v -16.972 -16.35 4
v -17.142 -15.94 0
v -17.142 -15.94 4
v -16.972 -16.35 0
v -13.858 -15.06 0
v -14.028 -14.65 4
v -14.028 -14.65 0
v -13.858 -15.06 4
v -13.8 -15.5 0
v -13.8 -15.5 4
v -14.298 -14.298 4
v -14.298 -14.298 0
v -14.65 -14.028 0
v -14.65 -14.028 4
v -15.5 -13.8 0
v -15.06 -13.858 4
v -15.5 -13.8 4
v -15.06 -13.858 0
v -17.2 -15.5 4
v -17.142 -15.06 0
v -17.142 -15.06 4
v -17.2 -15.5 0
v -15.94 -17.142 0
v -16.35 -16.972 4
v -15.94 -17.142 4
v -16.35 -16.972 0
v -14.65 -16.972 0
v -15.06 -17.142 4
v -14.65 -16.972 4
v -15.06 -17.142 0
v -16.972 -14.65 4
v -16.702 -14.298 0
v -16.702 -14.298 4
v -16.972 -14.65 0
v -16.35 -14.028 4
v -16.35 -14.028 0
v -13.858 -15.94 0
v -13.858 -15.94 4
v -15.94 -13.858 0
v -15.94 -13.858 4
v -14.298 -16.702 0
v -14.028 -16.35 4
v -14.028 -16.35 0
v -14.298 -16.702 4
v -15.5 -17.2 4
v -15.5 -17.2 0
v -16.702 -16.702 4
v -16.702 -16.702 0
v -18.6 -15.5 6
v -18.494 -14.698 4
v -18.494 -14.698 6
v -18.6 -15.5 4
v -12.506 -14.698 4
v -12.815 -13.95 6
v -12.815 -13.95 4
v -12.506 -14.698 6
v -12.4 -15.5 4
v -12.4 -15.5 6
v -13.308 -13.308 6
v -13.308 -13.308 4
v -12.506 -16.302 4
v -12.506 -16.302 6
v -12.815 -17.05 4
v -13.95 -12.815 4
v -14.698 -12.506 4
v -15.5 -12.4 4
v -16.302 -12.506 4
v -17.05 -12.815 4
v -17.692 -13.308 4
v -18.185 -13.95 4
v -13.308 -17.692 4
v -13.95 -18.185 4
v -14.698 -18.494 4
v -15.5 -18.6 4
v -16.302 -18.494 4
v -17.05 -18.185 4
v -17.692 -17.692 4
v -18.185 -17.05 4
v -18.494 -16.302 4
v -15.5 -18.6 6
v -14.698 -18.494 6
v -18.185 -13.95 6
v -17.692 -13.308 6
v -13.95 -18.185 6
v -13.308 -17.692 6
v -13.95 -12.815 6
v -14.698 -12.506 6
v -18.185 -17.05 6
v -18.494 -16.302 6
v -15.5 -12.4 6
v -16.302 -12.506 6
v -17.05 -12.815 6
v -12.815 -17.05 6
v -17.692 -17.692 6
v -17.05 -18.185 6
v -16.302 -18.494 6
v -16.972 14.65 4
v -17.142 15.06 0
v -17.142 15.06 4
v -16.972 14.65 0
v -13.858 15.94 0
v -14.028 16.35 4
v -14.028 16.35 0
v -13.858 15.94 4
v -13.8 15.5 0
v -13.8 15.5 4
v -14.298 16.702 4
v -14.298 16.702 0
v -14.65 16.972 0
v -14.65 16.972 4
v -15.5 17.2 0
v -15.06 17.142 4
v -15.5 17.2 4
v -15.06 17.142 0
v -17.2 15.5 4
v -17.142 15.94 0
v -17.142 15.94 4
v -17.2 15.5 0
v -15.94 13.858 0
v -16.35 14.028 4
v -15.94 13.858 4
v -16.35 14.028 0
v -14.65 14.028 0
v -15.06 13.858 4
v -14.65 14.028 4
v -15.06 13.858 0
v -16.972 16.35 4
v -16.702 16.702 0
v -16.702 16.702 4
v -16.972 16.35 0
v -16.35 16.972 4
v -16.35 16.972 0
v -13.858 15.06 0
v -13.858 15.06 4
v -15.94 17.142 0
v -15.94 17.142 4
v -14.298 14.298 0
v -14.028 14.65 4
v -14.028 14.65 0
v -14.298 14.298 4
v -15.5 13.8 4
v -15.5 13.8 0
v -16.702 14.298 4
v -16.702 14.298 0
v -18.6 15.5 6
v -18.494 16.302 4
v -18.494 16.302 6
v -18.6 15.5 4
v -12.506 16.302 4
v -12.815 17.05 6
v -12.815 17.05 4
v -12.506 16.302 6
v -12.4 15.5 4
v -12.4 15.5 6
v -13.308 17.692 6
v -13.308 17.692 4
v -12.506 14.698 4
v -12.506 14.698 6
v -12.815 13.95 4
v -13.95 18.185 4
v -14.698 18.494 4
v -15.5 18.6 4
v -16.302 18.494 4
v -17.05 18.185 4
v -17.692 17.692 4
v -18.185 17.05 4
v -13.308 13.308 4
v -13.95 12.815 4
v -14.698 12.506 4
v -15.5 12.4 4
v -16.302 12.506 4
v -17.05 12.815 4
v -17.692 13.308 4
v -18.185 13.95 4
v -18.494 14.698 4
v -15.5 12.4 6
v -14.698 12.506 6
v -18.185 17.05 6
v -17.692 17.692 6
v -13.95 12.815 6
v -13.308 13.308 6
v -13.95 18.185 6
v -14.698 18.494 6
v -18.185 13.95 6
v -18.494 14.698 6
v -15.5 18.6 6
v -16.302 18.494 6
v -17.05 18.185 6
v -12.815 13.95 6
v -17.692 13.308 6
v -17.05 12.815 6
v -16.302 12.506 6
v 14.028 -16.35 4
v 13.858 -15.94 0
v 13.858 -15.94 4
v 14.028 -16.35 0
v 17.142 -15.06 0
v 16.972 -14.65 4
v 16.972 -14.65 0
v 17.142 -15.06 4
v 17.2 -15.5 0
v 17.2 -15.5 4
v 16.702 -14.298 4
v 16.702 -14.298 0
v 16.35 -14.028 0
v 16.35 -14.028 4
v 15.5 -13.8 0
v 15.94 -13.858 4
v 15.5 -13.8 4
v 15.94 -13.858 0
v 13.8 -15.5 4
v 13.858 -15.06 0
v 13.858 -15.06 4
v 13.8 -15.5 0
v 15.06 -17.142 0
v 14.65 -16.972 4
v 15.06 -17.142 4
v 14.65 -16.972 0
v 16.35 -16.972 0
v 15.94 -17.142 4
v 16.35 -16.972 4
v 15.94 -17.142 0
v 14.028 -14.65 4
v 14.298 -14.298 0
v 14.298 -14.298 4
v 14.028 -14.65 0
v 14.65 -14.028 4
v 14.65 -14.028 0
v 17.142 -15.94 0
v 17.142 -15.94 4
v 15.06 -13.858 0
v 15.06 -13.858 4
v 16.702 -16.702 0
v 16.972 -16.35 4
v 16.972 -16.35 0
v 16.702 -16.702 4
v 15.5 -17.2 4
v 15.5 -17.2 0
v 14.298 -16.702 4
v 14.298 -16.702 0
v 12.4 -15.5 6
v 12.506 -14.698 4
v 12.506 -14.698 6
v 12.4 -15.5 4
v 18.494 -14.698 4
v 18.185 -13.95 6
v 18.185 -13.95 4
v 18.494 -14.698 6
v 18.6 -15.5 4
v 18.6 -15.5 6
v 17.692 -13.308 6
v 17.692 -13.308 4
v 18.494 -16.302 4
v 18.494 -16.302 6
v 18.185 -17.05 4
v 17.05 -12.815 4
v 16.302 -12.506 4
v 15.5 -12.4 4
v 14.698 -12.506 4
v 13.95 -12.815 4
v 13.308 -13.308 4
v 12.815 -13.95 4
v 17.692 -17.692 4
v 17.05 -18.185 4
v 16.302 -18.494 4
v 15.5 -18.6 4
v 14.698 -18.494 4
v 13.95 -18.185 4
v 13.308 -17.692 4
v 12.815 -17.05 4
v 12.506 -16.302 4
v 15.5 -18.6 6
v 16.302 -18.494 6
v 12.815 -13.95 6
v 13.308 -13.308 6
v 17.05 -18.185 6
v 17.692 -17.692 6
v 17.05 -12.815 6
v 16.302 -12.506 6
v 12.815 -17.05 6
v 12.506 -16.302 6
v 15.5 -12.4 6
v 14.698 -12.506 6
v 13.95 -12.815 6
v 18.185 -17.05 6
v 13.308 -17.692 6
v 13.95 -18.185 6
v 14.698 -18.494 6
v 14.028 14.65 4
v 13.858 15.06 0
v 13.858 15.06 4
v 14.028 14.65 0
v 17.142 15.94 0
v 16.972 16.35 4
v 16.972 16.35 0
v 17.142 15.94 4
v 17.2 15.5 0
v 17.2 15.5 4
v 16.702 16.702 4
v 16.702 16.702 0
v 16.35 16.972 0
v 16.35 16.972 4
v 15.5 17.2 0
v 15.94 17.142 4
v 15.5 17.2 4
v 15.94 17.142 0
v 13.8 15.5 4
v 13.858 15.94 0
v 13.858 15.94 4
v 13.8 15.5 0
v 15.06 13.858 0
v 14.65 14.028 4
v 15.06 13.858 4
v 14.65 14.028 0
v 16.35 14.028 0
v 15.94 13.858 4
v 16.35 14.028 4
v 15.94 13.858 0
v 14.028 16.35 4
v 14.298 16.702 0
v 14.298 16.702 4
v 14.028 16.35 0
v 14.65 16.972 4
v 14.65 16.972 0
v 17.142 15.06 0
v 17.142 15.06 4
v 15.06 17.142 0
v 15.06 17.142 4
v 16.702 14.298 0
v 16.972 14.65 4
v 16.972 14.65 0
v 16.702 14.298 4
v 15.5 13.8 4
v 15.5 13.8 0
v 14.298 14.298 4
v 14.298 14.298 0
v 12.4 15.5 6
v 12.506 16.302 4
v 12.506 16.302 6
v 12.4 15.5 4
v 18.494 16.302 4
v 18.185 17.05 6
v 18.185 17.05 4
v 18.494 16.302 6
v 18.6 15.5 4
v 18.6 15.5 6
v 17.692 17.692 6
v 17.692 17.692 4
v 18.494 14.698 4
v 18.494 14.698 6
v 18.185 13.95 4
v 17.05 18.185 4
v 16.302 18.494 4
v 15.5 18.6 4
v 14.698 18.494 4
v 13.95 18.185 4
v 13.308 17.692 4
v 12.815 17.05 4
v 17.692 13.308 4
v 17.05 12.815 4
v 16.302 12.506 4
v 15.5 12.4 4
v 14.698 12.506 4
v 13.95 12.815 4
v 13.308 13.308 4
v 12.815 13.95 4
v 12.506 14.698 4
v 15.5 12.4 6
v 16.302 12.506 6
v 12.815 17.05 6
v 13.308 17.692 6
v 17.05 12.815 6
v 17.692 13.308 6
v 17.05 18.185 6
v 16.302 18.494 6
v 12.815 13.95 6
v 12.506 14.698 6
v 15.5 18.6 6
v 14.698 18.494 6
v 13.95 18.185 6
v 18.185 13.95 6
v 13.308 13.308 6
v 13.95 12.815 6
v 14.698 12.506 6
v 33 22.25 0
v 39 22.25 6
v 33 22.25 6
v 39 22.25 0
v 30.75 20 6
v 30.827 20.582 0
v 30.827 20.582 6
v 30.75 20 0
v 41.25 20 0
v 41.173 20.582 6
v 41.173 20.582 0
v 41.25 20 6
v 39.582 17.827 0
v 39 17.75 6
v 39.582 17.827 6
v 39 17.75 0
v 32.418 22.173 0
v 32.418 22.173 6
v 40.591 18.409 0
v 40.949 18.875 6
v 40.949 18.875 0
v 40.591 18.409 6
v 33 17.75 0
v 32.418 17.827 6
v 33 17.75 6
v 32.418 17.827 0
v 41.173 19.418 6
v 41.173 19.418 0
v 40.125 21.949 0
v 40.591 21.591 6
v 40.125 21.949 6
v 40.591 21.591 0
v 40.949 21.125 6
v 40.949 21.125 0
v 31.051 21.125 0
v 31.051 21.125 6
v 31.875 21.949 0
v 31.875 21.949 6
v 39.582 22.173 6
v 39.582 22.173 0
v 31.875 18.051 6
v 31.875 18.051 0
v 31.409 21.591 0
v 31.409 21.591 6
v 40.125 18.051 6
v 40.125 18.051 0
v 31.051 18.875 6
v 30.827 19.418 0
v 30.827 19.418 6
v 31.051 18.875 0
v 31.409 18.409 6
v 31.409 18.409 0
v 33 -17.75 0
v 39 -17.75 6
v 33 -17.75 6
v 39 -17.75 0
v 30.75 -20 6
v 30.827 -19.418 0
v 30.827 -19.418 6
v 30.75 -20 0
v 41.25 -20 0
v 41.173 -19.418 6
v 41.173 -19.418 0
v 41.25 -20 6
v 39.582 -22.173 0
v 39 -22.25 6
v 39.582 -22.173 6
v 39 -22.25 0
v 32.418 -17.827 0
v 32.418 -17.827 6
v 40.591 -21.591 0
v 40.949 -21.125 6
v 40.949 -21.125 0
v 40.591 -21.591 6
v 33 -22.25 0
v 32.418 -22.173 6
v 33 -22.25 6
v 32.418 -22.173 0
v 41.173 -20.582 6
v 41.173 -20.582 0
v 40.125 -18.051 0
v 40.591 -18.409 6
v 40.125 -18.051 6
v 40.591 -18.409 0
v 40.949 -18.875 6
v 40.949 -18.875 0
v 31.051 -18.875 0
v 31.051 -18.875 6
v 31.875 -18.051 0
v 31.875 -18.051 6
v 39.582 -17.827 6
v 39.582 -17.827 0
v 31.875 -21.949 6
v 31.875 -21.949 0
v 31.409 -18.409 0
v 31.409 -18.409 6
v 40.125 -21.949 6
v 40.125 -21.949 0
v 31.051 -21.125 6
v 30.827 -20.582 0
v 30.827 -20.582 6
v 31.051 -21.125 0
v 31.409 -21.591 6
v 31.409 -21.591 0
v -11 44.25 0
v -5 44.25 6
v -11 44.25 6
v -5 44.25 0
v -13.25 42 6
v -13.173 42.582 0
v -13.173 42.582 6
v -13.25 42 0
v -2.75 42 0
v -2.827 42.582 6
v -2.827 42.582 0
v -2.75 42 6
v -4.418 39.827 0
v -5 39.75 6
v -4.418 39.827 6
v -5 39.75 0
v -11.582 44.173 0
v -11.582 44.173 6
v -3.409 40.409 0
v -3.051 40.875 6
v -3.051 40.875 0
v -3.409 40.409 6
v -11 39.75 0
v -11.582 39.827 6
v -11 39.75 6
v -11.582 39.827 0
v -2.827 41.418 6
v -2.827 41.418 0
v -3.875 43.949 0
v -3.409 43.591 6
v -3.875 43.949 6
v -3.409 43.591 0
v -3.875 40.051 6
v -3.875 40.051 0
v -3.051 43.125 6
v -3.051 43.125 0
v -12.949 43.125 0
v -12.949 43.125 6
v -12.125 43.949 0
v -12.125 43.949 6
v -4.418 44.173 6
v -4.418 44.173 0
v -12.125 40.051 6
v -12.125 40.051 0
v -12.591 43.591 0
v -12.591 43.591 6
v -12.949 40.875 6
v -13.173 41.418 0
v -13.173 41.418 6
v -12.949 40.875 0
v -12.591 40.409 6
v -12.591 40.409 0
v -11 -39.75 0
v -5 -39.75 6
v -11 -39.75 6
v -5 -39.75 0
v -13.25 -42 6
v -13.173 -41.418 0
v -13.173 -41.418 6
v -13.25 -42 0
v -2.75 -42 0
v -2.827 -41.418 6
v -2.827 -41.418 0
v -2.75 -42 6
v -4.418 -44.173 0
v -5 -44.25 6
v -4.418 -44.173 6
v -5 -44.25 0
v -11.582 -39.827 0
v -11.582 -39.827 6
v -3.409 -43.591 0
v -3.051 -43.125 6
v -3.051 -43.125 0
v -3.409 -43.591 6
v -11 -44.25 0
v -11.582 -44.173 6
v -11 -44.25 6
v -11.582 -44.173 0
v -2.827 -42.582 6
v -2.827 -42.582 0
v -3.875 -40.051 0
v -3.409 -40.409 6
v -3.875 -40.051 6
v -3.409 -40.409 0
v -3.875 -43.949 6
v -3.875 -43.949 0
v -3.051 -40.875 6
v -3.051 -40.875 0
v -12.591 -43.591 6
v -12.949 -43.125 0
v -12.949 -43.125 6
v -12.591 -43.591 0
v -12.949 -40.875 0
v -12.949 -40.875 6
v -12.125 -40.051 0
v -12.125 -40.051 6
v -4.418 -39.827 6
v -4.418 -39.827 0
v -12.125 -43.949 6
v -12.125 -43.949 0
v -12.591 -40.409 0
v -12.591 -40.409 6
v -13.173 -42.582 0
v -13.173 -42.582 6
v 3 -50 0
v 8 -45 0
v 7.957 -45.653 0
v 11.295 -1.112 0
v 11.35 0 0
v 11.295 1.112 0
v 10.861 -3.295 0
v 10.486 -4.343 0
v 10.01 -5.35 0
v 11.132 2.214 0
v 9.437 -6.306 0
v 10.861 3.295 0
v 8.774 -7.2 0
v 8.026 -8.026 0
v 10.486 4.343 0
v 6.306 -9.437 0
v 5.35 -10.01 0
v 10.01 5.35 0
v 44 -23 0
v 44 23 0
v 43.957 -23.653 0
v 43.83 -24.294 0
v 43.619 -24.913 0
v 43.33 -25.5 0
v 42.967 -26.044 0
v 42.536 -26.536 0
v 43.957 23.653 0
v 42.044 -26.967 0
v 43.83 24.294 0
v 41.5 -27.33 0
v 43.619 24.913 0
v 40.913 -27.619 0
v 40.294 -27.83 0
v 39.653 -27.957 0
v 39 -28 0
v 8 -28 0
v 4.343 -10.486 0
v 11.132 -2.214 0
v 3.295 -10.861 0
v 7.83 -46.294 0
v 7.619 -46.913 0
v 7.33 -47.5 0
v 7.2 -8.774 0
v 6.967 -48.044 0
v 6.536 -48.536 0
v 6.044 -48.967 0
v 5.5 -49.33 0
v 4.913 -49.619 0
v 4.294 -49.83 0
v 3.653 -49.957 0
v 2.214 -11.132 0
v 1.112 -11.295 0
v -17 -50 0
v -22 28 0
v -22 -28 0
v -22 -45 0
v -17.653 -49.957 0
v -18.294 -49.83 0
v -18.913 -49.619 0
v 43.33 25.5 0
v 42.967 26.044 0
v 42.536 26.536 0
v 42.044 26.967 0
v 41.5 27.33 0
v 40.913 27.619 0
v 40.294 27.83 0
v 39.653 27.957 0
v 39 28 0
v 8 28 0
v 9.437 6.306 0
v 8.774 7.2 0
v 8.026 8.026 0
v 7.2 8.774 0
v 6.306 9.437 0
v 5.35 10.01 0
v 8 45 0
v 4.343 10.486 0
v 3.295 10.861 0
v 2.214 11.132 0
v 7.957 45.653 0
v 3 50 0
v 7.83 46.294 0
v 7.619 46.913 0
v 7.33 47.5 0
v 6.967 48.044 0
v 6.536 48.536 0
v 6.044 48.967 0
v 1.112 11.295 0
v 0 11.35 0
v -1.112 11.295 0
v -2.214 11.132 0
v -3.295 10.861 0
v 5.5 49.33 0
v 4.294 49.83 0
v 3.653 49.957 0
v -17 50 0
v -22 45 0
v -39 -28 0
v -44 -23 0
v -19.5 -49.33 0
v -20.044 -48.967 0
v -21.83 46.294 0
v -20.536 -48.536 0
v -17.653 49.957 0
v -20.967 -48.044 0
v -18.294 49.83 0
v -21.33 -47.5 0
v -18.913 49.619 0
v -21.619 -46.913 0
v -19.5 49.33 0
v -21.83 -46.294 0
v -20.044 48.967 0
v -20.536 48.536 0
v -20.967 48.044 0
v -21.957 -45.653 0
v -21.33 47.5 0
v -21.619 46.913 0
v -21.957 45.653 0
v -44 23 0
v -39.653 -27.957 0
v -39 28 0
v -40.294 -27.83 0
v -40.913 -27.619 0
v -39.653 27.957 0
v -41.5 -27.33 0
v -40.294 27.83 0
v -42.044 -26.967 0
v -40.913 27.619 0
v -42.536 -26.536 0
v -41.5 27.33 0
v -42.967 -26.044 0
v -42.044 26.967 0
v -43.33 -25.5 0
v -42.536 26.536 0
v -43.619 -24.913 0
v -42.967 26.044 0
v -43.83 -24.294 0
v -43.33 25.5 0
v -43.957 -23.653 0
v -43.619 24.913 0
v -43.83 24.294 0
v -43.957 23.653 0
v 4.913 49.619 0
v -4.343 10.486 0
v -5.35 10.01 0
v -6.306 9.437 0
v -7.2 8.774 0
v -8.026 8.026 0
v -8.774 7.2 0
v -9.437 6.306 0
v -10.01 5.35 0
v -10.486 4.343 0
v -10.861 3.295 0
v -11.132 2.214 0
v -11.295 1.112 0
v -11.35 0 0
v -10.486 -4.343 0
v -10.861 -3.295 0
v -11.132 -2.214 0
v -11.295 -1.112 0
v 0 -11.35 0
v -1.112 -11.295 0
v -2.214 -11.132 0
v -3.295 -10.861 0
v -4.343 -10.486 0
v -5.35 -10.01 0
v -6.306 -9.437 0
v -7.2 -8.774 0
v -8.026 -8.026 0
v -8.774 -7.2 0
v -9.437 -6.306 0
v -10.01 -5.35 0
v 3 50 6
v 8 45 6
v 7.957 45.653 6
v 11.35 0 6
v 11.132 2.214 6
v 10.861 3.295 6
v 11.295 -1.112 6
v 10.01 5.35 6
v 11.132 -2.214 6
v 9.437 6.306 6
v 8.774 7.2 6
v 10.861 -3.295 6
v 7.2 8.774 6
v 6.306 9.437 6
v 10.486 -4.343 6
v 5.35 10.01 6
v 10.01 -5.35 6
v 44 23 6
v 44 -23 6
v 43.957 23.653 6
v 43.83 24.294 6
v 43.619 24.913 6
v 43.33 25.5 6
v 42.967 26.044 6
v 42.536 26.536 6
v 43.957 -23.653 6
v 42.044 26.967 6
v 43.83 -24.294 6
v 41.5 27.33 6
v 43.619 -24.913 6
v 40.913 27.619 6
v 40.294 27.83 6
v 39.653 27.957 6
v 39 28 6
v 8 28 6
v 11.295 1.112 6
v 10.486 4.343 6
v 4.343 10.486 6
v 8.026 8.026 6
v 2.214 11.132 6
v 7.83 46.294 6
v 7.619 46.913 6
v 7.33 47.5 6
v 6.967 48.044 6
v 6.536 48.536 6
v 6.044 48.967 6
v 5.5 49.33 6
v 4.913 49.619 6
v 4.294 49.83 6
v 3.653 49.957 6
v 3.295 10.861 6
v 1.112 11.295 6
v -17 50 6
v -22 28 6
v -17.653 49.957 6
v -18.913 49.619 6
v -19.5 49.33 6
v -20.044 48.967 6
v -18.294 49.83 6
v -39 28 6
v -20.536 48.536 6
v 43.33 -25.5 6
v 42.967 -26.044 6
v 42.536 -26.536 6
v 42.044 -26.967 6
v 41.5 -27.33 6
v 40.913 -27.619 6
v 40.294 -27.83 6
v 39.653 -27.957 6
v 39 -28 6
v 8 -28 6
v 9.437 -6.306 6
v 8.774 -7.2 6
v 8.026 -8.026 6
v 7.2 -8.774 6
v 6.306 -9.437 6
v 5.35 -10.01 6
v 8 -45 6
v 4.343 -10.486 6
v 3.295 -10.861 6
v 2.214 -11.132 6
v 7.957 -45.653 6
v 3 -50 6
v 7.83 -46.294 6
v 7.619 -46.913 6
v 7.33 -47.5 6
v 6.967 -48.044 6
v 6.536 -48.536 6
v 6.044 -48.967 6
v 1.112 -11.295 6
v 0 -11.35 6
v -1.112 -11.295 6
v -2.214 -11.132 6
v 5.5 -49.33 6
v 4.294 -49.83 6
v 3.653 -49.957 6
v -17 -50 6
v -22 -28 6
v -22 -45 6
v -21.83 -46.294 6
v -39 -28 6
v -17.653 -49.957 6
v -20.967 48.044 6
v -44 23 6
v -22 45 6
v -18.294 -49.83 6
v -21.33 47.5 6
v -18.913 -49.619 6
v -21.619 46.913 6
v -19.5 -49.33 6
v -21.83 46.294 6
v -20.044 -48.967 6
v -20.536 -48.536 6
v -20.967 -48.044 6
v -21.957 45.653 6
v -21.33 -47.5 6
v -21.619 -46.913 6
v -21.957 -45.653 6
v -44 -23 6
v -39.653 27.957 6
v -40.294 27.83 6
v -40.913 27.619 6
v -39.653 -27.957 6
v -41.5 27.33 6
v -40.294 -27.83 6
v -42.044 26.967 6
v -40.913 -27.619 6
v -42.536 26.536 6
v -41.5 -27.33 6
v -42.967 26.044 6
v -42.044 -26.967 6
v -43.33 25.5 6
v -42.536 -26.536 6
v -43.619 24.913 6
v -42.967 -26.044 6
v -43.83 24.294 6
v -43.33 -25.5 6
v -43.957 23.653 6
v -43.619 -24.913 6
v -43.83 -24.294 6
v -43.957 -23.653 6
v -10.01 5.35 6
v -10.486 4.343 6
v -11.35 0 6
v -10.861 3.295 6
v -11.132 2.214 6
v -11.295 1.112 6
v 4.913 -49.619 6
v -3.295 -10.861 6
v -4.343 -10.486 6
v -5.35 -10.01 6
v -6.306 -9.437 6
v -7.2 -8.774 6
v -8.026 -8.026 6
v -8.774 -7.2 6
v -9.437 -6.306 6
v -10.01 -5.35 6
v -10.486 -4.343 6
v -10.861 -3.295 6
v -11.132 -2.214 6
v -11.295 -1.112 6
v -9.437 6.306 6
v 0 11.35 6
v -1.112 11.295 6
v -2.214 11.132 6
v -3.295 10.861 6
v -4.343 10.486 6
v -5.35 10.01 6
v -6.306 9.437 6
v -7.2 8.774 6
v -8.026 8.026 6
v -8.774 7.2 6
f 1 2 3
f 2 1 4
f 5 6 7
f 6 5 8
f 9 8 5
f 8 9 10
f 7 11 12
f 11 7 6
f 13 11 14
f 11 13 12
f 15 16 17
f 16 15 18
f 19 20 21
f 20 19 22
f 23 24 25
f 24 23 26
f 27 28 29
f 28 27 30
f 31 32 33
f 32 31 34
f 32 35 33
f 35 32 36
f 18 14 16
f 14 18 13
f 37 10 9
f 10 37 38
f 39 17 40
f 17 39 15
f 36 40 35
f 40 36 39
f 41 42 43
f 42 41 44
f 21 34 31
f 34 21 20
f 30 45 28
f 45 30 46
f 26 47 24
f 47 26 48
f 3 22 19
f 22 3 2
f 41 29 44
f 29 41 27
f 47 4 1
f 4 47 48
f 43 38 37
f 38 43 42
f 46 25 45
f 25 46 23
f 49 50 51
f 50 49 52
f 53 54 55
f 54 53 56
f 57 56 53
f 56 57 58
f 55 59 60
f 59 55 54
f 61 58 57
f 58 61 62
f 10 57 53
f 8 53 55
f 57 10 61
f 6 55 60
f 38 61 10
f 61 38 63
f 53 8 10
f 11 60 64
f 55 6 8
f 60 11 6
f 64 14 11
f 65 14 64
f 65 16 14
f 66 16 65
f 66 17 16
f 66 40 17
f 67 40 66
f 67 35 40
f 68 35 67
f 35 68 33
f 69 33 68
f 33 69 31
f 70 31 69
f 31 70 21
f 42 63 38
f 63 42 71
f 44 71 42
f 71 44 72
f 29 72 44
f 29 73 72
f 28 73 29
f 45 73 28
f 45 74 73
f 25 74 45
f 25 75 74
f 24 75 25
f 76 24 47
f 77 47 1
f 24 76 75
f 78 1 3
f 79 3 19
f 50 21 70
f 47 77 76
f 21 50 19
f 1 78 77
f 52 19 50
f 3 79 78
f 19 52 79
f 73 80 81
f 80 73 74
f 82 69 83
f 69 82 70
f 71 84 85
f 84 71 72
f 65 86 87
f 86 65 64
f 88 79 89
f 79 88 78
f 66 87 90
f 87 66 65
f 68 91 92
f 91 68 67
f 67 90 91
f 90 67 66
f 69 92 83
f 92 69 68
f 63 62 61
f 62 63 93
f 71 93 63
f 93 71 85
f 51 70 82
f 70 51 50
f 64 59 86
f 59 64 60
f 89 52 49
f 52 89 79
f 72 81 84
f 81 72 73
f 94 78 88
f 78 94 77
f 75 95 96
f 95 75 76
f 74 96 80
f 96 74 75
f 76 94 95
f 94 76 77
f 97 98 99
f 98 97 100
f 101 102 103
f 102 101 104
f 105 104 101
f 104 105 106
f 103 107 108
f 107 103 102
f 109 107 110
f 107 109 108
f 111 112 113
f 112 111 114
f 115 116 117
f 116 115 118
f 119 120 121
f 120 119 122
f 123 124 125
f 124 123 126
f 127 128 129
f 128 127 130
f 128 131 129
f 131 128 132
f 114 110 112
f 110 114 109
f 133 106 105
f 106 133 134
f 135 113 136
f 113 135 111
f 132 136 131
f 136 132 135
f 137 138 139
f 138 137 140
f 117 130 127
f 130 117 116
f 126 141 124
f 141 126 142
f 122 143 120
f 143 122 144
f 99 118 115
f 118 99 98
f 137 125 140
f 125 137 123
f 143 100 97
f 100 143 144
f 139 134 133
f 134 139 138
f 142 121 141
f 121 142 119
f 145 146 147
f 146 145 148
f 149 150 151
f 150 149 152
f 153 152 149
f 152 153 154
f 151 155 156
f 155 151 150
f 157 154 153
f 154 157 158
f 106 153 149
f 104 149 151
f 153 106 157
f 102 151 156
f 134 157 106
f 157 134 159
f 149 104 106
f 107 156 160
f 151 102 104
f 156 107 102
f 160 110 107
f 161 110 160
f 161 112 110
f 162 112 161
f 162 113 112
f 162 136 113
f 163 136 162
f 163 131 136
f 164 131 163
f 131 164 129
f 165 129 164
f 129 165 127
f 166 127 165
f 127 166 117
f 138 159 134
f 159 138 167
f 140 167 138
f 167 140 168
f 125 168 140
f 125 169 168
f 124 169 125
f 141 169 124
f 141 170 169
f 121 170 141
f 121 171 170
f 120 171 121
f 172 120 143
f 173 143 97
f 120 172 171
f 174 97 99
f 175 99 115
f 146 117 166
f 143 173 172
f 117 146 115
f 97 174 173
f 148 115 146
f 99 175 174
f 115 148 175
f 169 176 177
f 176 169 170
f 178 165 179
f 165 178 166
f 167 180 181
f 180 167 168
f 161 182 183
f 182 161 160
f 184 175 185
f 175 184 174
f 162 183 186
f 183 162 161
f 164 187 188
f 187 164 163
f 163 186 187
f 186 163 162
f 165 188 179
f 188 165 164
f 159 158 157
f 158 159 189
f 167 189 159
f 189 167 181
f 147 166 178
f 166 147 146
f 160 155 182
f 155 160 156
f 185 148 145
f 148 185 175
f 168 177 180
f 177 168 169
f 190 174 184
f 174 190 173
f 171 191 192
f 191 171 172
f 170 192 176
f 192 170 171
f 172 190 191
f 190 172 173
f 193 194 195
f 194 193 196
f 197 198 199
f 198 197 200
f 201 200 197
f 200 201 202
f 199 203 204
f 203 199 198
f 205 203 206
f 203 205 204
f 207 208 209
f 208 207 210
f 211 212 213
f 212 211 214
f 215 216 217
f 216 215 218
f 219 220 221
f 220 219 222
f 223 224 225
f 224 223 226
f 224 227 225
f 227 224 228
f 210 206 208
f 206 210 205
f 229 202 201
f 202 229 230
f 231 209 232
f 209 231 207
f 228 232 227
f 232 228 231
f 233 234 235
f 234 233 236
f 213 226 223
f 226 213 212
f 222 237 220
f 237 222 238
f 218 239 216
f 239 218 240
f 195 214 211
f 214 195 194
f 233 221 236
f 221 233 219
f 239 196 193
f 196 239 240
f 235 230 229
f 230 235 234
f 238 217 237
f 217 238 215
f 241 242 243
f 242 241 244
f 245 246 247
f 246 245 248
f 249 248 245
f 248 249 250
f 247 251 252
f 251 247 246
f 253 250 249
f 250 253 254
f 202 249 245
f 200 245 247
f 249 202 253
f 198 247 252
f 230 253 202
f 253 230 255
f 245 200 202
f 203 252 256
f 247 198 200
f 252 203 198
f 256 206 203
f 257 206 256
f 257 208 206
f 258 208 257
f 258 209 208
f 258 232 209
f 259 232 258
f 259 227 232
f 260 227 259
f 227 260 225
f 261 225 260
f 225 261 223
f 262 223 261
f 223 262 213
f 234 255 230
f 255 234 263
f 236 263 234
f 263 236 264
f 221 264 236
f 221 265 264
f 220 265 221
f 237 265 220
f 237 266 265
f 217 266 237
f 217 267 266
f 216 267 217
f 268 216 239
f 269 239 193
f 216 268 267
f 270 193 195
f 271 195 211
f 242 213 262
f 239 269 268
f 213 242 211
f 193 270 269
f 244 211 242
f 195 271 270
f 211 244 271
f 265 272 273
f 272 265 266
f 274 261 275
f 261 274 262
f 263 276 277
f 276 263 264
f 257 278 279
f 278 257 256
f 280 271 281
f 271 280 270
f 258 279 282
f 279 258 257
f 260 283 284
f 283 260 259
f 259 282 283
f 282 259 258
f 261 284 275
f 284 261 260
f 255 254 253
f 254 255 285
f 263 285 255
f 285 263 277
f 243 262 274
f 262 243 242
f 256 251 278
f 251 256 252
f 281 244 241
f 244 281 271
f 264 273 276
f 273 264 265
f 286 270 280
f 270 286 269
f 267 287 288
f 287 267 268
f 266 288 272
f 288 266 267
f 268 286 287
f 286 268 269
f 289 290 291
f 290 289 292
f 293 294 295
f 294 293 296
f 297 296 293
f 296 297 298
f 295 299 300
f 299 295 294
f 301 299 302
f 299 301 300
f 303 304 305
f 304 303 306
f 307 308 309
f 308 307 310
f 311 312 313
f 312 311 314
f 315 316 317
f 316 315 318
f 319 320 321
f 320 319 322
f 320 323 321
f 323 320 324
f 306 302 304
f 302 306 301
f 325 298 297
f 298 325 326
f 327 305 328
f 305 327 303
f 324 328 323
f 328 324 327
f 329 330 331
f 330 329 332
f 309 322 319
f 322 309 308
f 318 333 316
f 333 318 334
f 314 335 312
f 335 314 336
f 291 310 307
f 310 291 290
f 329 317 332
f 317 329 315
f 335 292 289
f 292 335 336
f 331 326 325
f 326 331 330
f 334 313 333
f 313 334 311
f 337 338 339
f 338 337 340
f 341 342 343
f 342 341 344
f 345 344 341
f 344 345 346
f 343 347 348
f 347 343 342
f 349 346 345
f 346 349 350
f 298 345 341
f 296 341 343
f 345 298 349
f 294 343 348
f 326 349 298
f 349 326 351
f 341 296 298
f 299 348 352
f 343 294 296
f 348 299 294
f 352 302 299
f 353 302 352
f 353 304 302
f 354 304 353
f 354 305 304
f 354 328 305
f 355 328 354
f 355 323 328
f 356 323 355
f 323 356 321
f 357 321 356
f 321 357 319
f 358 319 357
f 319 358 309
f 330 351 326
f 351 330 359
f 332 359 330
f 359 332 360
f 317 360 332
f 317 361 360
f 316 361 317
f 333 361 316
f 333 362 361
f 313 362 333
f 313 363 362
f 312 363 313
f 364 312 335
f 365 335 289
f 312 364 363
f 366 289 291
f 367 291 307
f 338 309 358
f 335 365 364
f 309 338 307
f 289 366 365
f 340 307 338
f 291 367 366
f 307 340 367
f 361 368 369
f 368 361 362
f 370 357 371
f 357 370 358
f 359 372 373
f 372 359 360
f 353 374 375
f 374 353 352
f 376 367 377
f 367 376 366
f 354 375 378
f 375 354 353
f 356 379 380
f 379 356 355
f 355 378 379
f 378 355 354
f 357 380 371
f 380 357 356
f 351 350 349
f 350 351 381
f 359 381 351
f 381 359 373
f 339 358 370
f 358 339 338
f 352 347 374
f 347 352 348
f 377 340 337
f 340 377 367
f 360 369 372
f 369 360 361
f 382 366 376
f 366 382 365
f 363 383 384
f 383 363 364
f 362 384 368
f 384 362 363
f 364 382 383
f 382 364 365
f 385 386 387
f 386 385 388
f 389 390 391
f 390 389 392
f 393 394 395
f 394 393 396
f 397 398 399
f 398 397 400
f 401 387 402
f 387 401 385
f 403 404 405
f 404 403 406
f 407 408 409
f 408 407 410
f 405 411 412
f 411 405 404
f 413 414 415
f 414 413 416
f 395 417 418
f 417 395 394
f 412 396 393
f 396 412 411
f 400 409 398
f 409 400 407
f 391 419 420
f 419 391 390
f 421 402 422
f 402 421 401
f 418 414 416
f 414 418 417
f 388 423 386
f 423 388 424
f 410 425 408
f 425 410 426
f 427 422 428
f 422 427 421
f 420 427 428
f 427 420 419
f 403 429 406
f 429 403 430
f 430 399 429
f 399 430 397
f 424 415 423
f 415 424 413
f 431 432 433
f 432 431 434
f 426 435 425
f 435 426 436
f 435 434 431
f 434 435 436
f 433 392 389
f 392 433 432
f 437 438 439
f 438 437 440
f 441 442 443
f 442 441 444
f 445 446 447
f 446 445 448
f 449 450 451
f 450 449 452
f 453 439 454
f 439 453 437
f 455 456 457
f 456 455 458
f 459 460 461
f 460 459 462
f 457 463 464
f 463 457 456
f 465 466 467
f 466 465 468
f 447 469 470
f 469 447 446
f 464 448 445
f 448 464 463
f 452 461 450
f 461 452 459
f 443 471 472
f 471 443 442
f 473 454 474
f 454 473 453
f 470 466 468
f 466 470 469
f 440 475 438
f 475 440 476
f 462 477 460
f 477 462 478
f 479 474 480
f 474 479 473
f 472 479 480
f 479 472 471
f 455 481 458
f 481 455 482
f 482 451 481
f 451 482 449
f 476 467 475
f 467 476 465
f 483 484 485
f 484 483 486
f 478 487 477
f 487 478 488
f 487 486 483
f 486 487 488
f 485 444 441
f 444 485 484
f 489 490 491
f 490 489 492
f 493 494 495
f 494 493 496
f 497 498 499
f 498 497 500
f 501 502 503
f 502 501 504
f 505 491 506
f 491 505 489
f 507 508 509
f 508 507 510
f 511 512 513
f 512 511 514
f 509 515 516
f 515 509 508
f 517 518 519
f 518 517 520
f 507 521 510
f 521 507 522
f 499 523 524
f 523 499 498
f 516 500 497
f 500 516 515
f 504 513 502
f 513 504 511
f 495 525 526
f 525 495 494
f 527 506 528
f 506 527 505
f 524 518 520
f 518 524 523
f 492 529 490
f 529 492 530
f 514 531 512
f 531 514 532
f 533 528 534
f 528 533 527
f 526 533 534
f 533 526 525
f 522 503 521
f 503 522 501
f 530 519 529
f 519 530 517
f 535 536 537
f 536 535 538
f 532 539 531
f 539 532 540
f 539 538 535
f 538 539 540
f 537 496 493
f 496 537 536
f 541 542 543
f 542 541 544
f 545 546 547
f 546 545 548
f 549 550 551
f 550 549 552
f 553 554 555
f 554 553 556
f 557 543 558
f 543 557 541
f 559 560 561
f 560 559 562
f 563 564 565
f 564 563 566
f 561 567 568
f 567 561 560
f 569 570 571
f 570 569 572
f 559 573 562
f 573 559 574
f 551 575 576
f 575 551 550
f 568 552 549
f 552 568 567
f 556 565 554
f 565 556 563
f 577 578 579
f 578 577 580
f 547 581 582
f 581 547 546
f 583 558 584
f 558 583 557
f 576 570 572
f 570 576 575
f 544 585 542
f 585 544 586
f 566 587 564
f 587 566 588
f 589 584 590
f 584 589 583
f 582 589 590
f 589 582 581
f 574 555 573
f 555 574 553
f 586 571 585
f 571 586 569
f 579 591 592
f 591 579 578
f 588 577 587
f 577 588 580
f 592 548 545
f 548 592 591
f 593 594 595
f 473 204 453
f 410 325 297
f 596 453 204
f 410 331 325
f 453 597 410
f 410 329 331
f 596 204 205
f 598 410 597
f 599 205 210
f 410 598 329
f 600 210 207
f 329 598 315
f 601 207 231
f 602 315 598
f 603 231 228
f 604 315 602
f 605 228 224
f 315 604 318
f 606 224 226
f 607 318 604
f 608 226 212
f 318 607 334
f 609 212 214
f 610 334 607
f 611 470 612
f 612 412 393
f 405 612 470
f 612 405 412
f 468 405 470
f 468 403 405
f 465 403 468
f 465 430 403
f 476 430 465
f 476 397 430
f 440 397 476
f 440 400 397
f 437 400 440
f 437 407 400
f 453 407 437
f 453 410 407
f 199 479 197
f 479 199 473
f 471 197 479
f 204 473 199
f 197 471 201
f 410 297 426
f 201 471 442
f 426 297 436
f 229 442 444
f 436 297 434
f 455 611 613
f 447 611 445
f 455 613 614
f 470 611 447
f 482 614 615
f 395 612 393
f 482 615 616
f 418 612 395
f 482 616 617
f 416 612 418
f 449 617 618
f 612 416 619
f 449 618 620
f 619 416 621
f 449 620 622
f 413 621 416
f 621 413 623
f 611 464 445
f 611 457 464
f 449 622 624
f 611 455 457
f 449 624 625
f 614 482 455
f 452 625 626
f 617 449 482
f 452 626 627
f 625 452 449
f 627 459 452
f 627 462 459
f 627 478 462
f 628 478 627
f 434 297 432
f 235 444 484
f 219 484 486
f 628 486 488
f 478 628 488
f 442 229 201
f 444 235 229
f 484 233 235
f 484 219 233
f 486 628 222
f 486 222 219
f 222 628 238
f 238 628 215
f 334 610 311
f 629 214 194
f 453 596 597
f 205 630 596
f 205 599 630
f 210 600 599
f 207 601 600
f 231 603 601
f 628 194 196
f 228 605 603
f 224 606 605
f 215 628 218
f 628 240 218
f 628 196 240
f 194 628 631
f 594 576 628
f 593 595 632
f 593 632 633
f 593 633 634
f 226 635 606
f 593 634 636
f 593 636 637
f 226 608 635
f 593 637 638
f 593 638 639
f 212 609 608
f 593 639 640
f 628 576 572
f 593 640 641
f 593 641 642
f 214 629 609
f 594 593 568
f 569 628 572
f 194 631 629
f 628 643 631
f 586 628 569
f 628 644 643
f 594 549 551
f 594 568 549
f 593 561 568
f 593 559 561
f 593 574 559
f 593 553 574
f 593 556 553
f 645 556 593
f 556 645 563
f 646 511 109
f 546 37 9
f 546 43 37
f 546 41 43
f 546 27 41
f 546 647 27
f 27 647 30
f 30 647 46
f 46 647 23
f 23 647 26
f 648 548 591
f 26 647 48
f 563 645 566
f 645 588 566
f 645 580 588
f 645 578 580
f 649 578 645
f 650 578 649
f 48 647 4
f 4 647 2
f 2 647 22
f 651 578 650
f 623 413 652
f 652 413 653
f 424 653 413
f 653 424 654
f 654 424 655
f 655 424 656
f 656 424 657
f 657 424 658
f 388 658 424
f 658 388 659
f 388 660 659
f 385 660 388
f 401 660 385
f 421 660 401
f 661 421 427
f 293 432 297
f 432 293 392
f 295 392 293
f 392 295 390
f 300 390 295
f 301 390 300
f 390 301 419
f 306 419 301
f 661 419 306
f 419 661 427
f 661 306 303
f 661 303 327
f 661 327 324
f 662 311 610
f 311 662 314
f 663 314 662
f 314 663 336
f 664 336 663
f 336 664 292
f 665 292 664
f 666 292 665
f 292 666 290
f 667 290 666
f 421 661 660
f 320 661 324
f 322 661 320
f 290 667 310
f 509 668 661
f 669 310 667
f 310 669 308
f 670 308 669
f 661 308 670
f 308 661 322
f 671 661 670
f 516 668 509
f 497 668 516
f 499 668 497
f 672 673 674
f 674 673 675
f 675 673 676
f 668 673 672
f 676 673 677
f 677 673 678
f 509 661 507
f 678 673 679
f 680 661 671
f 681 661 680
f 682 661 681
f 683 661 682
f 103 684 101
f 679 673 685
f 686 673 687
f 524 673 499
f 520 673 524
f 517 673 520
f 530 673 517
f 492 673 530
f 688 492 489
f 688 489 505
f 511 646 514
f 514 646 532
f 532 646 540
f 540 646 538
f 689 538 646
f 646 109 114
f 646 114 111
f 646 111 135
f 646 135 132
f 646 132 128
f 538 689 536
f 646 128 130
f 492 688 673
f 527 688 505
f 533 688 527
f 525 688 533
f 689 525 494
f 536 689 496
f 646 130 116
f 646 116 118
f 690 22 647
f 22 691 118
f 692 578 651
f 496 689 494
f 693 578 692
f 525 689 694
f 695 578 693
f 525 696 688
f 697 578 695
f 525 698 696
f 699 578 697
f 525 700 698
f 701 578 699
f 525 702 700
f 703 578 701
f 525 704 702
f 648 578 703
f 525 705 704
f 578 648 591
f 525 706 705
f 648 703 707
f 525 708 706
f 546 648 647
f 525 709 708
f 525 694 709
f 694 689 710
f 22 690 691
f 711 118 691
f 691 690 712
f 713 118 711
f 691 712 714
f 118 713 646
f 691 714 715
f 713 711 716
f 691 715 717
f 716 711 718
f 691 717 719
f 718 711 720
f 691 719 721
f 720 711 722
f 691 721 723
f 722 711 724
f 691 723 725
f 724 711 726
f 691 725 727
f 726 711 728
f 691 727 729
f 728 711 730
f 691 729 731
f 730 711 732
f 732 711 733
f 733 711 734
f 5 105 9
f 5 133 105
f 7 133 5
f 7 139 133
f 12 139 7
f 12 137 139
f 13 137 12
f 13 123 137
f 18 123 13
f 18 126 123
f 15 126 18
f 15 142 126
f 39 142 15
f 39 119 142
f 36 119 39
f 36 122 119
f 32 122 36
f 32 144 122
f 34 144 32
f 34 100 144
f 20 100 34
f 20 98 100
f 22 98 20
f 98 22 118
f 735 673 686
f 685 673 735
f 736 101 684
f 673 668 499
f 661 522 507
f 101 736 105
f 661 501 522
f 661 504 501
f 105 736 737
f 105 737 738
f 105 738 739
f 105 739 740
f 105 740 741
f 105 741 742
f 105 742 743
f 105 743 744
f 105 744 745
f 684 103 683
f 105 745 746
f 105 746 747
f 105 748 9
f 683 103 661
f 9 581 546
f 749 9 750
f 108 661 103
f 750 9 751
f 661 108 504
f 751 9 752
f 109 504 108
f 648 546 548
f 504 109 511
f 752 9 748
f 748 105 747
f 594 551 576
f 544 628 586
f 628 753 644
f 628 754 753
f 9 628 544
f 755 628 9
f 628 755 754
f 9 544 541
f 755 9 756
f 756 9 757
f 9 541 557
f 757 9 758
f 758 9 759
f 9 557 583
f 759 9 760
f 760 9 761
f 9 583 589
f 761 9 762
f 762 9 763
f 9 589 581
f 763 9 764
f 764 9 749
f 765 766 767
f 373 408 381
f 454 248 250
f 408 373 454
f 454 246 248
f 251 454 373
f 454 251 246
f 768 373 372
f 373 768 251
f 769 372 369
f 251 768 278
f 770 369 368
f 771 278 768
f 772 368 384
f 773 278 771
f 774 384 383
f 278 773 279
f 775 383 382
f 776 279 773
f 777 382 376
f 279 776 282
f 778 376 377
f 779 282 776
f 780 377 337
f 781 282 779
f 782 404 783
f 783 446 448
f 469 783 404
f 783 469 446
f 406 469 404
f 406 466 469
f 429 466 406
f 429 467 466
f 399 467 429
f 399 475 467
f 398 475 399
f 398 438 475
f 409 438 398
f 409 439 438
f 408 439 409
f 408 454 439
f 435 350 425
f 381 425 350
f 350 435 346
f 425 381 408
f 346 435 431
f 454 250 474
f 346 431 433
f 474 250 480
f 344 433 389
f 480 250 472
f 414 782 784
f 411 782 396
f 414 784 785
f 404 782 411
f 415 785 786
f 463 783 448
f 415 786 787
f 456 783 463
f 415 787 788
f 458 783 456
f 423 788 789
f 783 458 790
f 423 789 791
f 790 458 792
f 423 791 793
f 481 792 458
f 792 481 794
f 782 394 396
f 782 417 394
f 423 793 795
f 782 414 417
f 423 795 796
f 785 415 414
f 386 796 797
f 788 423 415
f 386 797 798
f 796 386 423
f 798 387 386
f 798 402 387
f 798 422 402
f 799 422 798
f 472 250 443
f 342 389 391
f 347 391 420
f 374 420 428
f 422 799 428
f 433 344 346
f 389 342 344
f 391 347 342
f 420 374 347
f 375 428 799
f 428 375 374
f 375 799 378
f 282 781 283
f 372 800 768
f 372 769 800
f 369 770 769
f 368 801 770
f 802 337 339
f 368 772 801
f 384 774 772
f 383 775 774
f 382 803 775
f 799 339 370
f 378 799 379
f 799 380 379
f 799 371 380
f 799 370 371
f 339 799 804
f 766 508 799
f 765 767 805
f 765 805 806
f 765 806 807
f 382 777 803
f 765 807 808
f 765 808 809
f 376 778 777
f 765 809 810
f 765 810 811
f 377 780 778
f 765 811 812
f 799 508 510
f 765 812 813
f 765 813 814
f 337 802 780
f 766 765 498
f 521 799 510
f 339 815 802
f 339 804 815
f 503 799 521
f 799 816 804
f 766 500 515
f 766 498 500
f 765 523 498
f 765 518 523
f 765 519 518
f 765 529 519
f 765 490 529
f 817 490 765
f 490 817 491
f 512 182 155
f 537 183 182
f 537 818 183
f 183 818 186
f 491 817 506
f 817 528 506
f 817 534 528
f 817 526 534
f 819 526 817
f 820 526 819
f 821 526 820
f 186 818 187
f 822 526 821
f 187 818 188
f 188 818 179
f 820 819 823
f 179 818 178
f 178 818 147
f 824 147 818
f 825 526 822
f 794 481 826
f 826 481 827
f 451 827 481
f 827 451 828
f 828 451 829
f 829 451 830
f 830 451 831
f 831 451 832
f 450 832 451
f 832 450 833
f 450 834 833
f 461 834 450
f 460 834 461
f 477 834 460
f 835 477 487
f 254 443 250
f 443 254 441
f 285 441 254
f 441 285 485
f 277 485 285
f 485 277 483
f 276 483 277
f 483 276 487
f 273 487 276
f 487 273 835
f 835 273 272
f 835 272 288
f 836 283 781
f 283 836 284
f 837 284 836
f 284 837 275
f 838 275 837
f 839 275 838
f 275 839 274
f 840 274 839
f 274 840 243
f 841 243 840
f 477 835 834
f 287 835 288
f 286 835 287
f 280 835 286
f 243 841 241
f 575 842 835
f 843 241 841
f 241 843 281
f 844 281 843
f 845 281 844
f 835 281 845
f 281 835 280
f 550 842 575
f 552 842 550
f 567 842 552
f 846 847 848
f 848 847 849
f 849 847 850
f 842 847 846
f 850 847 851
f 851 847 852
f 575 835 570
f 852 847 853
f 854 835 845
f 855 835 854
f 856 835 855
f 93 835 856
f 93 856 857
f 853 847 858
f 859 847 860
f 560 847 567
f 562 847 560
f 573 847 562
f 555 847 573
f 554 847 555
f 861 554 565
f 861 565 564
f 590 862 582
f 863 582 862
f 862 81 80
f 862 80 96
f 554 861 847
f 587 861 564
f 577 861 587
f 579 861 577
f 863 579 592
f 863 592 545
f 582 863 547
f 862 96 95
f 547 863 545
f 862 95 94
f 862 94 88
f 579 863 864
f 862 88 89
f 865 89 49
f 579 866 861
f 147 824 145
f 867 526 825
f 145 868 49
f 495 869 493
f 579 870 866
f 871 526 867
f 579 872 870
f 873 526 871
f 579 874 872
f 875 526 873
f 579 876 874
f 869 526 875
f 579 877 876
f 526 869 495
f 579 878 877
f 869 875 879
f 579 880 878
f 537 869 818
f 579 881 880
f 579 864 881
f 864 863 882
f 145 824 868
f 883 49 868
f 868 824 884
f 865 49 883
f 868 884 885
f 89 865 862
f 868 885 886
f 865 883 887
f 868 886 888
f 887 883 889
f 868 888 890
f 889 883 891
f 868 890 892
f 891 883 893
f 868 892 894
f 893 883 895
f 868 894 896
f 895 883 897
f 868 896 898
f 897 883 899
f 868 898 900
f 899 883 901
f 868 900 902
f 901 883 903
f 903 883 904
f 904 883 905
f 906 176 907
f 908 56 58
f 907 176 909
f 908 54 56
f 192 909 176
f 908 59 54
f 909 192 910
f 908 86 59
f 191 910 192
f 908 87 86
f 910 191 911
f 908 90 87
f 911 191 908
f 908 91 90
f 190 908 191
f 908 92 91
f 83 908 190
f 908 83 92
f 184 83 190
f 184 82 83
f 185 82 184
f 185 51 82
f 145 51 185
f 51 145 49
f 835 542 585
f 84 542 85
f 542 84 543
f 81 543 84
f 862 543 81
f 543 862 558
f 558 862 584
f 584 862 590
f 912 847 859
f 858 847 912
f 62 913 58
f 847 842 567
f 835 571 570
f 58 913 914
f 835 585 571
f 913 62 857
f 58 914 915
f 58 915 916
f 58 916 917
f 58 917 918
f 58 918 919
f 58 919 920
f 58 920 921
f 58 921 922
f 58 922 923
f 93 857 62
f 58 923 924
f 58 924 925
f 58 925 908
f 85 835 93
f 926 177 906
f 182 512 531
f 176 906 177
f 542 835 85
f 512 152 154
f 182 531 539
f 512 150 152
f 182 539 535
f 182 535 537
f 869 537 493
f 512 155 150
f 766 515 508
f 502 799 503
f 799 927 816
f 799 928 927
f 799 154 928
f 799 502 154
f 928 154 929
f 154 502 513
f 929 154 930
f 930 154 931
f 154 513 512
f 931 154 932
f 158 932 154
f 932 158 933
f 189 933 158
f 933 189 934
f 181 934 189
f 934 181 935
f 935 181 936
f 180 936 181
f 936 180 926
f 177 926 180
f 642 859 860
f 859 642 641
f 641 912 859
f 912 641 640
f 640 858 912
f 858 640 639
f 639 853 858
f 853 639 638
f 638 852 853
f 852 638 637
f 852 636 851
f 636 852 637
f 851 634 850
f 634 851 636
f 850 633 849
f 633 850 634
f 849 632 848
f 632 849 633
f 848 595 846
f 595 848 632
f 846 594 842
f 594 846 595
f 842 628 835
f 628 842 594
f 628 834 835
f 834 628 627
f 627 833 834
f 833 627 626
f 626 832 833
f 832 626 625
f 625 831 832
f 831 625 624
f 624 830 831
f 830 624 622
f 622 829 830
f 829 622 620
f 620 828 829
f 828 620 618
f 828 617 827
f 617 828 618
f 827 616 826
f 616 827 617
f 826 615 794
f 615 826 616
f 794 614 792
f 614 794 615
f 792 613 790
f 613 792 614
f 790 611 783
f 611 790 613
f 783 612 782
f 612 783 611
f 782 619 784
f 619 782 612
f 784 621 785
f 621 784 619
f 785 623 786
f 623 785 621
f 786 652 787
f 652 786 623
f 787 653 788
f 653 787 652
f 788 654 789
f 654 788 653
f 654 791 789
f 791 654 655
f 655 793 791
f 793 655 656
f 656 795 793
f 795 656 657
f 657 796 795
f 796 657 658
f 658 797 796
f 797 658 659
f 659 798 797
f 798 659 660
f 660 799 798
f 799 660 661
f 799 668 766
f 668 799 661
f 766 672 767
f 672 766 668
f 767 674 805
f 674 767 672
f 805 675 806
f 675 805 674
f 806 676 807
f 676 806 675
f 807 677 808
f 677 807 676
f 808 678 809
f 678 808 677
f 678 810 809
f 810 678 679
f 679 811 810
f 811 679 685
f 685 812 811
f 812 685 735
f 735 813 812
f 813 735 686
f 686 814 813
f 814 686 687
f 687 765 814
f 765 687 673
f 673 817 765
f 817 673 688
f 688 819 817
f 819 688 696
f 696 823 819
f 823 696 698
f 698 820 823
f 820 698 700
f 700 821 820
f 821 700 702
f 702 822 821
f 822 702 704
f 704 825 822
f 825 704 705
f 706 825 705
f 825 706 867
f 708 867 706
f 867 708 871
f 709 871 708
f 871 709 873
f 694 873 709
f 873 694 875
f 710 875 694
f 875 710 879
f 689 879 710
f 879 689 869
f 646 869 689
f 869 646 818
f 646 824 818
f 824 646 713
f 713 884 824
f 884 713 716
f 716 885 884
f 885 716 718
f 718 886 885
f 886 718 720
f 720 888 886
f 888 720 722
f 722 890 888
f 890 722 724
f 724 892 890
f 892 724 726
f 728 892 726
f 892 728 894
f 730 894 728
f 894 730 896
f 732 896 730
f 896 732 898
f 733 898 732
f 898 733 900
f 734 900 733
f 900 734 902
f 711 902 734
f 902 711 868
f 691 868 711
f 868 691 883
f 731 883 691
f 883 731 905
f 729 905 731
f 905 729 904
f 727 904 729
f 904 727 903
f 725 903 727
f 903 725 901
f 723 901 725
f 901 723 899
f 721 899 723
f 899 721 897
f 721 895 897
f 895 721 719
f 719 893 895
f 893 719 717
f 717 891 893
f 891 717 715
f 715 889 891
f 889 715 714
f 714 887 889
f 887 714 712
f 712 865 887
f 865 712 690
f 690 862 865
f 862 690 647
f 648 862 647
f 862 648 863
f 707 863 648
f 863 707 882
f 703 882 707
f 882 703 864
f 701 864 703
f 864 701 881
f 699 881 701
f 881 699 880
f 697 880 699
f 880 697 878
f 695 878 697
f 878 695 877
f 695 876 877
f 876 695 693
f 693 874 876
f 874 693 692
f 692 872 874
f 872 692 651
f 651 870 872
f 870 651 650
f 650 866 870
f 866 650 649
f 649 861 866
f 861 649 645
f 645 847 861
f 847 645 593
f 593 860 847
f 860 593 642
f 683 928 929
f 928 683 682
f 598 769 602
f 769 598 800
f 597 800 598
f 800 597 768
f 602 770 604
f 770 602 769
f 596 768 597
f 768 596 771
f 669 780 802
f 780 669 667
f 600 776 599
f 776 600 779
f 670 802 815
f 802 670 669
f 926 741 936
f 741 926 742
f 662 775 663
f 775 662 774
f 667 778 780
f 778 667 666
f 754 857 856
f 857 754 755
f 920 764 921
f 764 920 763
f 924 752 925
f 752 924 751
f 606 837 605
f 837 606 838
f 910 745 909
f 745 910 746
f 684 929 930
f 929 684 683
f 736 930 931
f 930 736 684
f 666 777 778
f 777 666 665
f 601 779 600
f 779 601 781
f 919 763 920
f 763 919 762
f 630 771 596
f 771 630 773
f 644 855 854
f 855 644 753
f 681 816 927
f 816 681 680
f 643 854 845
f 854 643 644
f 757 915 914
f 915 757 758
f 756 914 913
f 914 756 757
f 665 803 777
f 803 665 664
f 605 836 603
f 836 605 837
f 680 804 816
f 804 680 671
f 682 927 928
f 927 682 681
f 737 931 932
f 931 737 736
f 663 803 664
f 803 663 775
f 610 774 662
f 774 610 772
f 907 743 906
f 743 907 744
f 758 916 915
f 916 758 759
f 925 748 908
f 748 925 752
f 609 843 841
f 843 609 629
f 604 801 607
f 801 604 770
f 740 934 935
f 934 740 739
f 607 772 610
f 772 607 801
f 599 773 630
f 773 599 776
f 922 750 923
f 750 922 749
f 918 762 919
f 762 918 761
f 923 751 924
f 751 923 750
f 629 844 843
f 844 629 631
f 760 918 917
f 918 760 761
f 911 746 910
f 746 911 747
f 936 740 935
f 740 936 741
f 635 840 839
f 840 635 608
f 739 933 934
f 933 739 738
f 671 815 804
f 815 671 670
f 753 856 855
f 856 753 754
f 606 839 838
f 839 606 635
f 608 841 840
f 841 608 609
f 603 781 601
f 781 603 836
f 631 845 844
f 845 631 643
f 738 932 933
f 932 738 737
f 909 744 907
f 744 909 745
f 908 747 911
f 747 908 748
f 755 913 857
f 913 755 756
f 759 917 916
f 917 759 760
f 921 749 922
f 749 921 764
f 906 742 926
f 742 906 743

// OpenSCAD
// file: ../lib/helpers.scad
// Personal helper routines (house style for all OpenSCAD in this repo).
// Conventions:
//   tx/ty/tz(q)  translate along one axis; q may be a list -> replicate
//   txy/tyz/txz  translate in a plane by [a,b] or list of pairs -> replicate
//   rx/ry/rz(q)  rotate about one axis; list -> replicate
//   mx/my/mz(q)  mirror about one axis; list like [0,1] -> original + mirrored
//   cub(d, c)    cube with per-axis centering: 0 from origin, 1 centered,
//                -1 extending negative
//   sq(d, c, r)  2D analog of cub, optional corner radius r
//   hull_seq()   hull each adjacent pair of children (chained hulls)
// Prefer these over raw translate/rotate/mirror throughout.

module hull_seq()
  for (i=[0:$children-2]) hull() { children(i); children(i+1); }

module cub(d, c=[0, 0, 0])
  tx(c[0] == -1 ? -d[0] : c[0] ? -d[0]/2 : 0)
  ty(c[1] == -1 ? -d[1] : c[1] ? -d[1]/2 : 0)
  tz(c[2] == -1 ? -d[2] : c[2] ? -d[2]/2 : 0)
  cube(d);

module sq(d, c=[0, 0], r=0)
  tx(c[0] == -1 ? -d[0] : c[0] ? -d[0]/2 : 0)
  ty(c[1] == -1 ? -d[1] : c[1] ? -d[1]/2 : 0)
  if (r <= 0) { square(d); }
  else { hull() ty([r, d[1]-r]) tx([r, d[0]-r]) circle(r=r); }

module txy(q)
  if (is_list(q) && is_list(q[0])) for (qq=q) txy(qq) children();
  else translate([q[0], q[1], 0]) children();

module tyz(q)
  if (is_list(q) && is_list(q[0])) for (qq=q) tyz(qq) children();
  else translate([0, q[0], q[1]]) children();

module txz(q)
  if (is_list(q) && is_list(q[0])) for (qq=q) txz(qq) children();
  else translate([q[0], 0, q[1]]) children();

module tq(q, v)
  if (is_list(q)) for (qq=q) tq(qq, v) children();
  else translate(q*v) children();

module tx(q) tq(q, [1, 0, 0]) children();
module ty(q) tq(q, [0, 1, 0]) children();
module tz(q) tq(q, [0, 0, 1]) children();

module mq(q, v)
  if (is_list(q)) for (qq=q) mq(qq, v) children();
  else mirror(q*v) children();

module mx(q=1) mq(q, [1, 0, 0]) children();
module my(q=1) mq(q, [0, 1, 0]) children();
module mz(q=1) mq(q, [0, 0, 1]) children();

// generic rotation recursively expands q and rotates about v
module rq(q, v)
  if (is_list(q)) for (qq=q) rq(qq, v) children();
  else rotate(q*v) children();

// specific rotation about x, y, z for everyday convenience
module rx(q) rq(q, [1, 0, 0]) children();
module ry(q) rq(q, [0, 1, 0]) children();
module rz(q) rq(q, [0, 0, 1]) children();
// main file
// Rigid NEMA 17 mount plate. The motor body plunges through the board
// cutout and hangs from this plate by its face screws (counterbored so
// the heads clear the pinion above); the plate sits flat on the board.
// Mesh is set by sliding the plate along its foot slots (local X, the
// radial/mesh direction), pressing the gears together, and tightening —
// no preload flexure on the test rig.
//
// Local coords: pinion axis at the origin, gear toward -X, z = 0 at the
// board face. Print flat.

include <params.scad>
use <../lib/helpers.scad>

module motor_mount() {
  difference() {
    linear_extrude(motor_plate_t) {
      sq(motor_plate, [1, 1], 5);
      // tangential wings carry the inboard feet clear of the gear shadow
      tx(motor_wing_x) sq(motor_wing, [1, 1], 5);
    }
    // NEMA face screws, counterbored
    txy([for (x = [-1, 1], y = [-1, 1]) [x, y] * (nema17_hole_spacing / 2)]) {
      tz(-0.5) cylinder(d = 3.4, h = motor_plate_t + 1, $fn = 24);
      tz(motor_plate_t - 2) cylinder(d = 6.2, h = 2.5, $fn = 24);
    }
    tz(-0.5) cylinder(d = nema17_pilot_d + 0.4, h = motor_plate_t + 1, $fn = 64);
    // foot slots along the mesh direction
    txy(motor_feet) tz(-0.5)
      linear_extrude(motor_plate_t + 1)
        hull() tx([-motor_slide, motor_slide]) circle(d = 4.5, $fn = 24);
  }
}

motor_mount();
